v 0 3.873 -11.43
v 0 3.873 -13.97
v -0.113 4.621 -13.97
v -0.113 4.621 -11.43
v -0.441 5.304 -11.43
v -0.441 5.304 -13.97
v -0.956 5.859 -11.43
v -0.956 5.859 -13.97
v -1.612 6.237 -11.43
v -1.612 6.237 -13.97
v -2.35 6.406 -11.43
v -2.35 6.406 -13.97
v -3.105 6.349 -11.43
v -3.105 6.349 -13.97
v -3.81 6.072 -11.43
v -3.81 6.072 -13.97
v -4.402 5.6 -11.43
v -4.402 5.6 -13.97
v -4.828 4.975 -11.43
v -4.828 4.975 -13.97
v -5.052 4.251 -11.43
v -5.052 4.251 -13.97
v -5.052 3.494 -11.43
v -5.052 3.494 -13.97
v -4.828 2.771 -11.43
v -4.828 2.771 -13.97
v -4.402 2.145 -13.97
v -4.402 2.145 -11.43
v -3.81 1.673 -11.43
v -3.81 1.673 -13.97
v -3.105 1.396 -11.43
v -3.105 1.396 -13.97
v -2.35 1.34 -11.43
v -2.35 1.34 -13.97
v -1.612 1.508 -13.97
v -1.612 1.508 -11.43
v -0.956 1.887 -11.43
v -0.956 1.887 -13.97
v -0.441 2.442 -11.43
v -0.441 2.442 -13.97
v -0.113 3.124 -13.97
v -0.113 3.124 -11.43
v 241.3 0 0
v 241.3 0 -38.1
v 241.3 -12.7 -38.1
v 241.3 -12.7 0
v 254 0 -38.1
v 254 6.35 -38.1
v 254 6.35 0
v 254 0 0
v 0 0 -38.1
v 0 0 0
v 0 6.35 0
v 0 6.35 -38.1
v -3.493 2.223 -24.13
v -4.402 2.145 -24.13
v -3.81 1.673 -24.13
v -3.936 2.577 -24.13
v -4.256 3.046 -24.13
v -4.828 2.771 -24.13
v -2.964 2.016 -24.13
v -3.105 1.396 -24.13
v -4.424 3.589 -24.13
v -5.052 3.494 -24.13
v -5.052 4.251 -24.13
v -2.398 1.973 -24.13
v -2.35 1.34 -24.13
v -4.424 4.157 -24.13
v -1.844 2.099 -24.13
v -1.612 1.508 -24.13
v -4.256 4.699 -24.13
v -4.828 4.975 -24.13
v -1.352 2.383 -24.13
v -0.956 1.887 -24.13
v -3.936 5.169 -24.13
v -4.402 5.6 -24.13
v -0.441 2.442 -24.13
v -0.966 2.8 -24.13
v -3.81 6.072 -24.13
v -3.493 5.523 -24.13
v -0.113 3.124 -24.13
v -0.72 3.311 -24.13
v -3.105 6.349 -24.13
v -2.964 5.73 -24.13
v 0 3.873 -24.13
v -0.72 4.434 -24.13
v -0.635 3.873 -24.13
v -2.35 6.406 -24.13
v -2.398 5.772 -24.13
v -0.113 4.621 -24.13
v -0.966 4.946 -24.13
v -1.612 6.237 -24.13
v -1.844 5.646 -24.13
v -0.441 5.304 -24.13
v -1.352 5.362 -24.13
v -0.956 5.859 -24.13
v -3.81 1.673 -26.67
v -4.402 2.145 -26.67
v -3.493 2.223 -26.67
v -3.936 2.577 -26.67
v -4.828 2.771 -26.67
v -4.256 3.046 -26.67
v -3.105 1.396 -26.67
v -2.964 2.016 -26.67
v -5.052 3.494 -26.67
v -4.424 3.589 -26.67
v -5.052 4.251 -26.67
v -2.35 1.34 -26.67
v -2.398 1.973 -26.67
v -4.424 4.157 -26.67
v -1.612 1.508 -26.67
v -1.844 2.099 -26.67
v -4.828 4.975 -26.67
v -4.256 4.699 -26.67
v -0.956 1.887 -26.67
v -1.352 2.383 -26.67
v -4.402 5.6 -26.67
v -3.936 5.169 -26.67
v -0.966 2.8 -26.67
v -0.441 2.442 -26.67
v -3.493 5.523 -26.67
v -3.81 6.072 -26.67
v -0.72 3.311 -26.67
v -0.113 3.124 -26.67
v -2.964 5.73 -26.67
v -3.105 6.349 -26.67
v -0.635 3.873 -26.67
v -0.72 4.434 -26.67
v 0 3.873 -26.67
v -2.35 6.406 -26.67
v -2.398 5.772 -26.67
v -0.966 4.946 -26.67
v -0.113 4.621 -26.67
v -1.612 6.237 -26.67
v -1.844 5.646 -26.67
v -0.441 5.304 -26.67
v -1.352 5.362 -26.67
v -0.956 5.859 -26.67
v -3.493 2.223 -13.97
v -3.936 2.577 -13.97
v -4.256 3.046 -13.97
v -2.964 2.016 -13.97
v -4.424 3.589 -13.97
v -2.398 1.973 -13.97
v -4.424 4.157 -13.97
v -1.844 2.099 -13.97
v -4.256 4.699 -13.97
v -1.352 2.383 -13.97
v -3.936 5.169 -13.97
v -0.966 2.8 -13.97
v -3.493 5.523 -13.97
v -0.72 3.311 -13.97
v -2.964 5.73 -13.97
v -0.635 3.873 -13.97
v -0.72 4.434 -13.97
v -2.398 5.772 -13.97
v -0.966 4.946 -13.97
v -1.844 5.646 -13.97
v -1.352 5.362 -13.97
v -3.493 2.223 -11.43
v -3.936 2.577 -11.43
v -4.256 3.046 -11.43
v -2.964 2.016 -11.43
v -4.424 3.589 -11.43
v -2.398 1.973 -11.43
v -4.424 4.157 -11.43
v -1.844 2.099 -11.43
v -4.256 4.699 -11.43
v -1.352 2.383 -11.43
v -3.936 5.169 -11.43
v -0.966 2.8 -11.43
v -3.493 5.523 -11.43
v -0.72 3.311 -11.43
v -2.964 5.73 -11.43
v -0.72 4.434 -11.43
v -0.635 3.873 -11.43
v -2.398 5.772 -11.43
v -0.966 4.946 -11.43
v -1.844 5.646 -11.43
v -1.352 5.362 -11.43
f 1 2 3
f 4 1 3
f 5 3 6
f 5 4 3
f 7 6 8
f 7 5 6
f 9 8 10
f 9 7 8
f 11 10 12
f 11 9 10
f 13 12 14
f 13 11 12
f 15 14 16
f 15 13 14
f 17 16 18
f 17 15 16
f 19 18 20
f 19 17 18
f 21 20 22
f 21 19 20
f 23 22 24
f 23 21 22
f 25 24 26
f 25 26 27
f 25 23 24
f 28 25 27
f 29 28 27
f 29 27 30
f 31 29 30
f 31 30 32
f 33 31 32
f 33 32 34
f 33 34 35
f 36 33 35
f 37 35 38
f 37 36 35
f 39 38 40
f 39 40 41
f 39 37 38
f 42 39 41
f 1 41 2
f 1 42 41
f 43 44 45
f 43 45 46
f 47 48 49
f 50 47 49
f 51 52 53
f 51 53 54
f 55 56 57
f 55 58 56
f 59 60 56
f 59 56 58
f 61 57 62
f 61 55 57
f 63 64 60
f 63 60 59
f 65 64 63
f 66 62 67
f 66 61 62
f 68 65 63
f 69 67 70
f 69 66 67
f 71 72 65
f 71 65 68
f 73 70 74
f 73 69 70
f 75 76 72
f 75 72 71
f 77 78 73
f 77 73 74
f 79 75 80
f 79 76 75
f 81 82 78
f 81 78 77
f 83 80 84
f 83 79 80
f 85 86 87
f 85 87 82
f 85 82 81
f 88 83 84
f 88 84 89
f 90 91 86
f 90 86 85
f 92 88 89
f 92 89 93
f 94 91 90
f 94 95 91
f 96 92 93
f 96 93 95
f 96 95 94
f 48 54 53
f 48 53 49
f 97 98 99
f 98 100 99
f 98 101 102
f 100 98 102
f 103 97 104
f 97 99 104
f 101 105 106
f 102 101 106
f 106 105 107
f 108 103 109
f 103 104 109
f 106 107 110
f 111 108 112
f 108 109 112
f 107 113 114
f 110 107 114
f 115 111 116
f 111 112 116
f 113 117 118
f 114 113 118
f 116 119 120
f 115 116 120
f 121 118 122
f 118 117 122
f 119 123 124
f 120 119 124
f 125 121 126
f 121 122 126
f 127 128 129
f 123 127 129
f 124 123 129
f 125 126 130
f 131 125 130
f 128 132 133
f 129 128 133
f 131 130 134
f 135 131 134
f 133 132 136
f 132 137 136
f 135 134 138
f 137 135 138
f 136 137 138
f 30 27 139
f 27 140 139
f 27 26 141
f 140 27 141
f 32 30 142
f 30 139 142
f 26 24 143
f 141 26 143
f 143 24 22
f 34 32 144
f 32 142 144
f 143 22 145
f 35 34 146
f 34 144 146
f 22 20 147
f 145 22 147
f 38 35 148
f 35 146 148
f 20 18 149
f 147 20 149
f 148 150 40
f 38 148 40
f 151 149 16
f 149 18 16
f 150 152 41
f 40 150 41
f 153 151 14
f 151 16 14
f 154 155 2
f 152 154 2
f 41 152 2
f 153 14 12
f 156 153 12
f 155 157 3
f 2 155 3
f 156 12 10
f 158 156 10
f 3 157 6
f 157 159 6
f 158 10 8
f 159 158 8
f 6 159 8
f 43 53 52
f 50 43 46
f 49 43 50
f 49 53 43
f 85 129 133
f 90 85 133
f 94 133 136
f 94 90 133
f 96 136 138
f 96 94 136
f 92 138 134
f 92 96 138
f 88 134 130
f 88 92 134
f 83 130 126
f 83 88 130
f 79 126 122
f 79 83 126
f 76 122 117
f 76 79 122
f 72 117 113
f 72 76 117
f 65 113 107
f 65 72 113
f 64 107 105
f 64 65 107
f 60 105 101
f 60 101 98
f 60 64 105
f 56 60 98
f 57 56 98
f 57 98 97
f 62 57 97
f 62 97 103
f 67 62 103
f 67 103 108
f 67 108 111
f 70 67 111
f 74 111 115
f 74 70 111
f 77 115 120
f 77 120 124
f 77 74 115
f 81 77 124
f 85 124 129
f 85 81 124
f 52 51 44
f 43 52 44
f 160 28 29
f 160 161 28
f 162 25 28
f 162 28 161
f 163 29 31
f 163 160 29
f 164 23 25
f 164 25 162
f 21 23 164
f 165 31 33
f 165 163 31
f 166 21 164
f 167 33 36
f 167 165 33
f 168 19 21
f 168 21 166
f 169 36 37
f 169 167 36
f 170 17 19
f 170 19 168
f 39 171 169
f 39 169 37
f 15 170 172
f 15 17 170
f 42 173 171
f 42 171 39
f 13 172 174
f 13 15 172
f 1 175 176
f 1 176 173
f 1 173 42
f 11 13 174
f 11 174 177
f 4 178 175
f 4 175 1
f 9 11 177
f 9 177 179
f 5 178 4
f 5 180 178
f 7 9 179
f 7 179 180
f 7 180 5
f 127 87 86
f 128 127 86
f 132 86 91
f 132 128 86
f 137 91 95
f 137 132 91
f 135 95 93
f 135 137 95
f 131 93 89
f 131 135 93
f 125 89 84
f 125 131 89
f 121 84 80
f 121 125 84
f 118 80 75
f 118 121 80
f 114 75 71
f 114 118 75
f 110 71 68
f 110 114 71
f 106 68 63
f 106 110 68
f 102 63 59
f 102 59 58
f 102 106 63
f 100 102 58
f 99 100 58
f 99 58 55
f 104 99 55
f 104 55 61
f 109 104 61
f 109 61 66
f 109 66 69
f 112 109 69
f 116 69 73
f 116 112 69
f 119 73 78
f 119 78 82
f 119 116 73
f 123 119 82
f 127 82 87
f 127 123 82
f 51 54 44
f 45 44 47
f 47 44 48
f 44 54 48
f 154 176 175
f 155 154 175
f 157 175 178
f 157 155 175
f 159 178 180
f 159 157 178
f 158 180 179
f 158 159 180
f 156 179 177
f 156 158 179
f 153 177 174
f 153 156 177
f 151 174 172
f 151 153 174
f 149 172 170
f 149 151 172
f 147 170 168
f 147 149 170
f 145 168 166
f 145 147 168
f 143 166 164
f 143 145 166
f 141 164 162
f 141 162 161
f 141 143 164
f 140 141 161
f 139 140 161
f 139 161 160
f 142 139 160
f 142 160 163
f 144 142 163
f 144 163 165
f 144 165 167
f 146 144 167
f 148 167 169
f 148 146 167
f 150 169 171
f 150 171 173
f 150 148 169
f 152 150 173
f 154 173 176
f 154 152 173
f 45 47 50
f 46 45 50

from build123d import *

# Parameters (mm, degrees)
SKETCH1_W           = 254
SKETCH1_H           = 38.1
BOSS_EXTRUDE1_DEPTH = 6.35
SKETCH2_R           = 2.54
SKETCH2_R_2         = 1.905
BOSS_EXTRUDE2_DEPTH = 1.27
LPATTERN1_COUNT     = 2
LPATTERN1_PITCH     = 12.7
SKETCH5_W           = 12.7
SKETCH5_H           = 38.1
BOSS_EXTRUDE3_DEPTH = 12.7
CHAMFER1_SIZE       = 12.7


with BuildPart() as part:
    # Sketch1 → Boss-Extrude1 (new body)
    with BuildSketch(Plane(origin=(0, 0, 0), x_dir=(1, 0, 0), z_dir=(0, 1, 0))):
        with Locations((127, 19.05)):
            Rectangle(SKETCH1_W, SKETCH1_H)
    extrude(amount=BOSS_EXTRUDE1_DEPTH)

    # Sketch5 → Boss-Extrude3 (add)
    with BuildSketch(Plane.XZ):
        with Locations((247.65, -19.05)):
            Rectangle(SKETCH5_W, SKETCH5_H)
    extrude(amount=BOSS_EXTRUDE3_DEPTH)

    # Chamfer1
    chamfer1_edges = [part.edges().sort_by_distance(p)[0] for p in [
        (254, -12.7, -19.05),
    ]]
    chamfer(chamfer1_edges, length=CHAMFER1_SIZE - 0.0001)  # a hair under: the kernel refuses the full size


with BuildPart() as body_2:
    # Sketch2 → Boss-Extrude2 (new, symmetric)
    with BuildSketch(Plane.XY.offset(-12.7)):
        with Locations((-2.54, 3.872789775)):
            Circle(SKETCH2_R)
        with Locations((-2.54, 3.872789775)):
            Circle(SKETCH2_R_2, mode=Mode.SUBTRACT)
    boss_extrude2 = extrude(amount=BOSS_EXTRUDE2_DEPTH, both=True)


with BuildPart() as lpattern1_1:
    # LPattern1: Boss-Extrude2 ×2
    with Locations(*[(0, 0, -i * LPATTERN1_PITCH) for i in range(1, LPATTERN1_COUNT)]):
        add(boss_extrude2)


solid = Compound([part.part, body_2.part, lpattern1_1.part])
